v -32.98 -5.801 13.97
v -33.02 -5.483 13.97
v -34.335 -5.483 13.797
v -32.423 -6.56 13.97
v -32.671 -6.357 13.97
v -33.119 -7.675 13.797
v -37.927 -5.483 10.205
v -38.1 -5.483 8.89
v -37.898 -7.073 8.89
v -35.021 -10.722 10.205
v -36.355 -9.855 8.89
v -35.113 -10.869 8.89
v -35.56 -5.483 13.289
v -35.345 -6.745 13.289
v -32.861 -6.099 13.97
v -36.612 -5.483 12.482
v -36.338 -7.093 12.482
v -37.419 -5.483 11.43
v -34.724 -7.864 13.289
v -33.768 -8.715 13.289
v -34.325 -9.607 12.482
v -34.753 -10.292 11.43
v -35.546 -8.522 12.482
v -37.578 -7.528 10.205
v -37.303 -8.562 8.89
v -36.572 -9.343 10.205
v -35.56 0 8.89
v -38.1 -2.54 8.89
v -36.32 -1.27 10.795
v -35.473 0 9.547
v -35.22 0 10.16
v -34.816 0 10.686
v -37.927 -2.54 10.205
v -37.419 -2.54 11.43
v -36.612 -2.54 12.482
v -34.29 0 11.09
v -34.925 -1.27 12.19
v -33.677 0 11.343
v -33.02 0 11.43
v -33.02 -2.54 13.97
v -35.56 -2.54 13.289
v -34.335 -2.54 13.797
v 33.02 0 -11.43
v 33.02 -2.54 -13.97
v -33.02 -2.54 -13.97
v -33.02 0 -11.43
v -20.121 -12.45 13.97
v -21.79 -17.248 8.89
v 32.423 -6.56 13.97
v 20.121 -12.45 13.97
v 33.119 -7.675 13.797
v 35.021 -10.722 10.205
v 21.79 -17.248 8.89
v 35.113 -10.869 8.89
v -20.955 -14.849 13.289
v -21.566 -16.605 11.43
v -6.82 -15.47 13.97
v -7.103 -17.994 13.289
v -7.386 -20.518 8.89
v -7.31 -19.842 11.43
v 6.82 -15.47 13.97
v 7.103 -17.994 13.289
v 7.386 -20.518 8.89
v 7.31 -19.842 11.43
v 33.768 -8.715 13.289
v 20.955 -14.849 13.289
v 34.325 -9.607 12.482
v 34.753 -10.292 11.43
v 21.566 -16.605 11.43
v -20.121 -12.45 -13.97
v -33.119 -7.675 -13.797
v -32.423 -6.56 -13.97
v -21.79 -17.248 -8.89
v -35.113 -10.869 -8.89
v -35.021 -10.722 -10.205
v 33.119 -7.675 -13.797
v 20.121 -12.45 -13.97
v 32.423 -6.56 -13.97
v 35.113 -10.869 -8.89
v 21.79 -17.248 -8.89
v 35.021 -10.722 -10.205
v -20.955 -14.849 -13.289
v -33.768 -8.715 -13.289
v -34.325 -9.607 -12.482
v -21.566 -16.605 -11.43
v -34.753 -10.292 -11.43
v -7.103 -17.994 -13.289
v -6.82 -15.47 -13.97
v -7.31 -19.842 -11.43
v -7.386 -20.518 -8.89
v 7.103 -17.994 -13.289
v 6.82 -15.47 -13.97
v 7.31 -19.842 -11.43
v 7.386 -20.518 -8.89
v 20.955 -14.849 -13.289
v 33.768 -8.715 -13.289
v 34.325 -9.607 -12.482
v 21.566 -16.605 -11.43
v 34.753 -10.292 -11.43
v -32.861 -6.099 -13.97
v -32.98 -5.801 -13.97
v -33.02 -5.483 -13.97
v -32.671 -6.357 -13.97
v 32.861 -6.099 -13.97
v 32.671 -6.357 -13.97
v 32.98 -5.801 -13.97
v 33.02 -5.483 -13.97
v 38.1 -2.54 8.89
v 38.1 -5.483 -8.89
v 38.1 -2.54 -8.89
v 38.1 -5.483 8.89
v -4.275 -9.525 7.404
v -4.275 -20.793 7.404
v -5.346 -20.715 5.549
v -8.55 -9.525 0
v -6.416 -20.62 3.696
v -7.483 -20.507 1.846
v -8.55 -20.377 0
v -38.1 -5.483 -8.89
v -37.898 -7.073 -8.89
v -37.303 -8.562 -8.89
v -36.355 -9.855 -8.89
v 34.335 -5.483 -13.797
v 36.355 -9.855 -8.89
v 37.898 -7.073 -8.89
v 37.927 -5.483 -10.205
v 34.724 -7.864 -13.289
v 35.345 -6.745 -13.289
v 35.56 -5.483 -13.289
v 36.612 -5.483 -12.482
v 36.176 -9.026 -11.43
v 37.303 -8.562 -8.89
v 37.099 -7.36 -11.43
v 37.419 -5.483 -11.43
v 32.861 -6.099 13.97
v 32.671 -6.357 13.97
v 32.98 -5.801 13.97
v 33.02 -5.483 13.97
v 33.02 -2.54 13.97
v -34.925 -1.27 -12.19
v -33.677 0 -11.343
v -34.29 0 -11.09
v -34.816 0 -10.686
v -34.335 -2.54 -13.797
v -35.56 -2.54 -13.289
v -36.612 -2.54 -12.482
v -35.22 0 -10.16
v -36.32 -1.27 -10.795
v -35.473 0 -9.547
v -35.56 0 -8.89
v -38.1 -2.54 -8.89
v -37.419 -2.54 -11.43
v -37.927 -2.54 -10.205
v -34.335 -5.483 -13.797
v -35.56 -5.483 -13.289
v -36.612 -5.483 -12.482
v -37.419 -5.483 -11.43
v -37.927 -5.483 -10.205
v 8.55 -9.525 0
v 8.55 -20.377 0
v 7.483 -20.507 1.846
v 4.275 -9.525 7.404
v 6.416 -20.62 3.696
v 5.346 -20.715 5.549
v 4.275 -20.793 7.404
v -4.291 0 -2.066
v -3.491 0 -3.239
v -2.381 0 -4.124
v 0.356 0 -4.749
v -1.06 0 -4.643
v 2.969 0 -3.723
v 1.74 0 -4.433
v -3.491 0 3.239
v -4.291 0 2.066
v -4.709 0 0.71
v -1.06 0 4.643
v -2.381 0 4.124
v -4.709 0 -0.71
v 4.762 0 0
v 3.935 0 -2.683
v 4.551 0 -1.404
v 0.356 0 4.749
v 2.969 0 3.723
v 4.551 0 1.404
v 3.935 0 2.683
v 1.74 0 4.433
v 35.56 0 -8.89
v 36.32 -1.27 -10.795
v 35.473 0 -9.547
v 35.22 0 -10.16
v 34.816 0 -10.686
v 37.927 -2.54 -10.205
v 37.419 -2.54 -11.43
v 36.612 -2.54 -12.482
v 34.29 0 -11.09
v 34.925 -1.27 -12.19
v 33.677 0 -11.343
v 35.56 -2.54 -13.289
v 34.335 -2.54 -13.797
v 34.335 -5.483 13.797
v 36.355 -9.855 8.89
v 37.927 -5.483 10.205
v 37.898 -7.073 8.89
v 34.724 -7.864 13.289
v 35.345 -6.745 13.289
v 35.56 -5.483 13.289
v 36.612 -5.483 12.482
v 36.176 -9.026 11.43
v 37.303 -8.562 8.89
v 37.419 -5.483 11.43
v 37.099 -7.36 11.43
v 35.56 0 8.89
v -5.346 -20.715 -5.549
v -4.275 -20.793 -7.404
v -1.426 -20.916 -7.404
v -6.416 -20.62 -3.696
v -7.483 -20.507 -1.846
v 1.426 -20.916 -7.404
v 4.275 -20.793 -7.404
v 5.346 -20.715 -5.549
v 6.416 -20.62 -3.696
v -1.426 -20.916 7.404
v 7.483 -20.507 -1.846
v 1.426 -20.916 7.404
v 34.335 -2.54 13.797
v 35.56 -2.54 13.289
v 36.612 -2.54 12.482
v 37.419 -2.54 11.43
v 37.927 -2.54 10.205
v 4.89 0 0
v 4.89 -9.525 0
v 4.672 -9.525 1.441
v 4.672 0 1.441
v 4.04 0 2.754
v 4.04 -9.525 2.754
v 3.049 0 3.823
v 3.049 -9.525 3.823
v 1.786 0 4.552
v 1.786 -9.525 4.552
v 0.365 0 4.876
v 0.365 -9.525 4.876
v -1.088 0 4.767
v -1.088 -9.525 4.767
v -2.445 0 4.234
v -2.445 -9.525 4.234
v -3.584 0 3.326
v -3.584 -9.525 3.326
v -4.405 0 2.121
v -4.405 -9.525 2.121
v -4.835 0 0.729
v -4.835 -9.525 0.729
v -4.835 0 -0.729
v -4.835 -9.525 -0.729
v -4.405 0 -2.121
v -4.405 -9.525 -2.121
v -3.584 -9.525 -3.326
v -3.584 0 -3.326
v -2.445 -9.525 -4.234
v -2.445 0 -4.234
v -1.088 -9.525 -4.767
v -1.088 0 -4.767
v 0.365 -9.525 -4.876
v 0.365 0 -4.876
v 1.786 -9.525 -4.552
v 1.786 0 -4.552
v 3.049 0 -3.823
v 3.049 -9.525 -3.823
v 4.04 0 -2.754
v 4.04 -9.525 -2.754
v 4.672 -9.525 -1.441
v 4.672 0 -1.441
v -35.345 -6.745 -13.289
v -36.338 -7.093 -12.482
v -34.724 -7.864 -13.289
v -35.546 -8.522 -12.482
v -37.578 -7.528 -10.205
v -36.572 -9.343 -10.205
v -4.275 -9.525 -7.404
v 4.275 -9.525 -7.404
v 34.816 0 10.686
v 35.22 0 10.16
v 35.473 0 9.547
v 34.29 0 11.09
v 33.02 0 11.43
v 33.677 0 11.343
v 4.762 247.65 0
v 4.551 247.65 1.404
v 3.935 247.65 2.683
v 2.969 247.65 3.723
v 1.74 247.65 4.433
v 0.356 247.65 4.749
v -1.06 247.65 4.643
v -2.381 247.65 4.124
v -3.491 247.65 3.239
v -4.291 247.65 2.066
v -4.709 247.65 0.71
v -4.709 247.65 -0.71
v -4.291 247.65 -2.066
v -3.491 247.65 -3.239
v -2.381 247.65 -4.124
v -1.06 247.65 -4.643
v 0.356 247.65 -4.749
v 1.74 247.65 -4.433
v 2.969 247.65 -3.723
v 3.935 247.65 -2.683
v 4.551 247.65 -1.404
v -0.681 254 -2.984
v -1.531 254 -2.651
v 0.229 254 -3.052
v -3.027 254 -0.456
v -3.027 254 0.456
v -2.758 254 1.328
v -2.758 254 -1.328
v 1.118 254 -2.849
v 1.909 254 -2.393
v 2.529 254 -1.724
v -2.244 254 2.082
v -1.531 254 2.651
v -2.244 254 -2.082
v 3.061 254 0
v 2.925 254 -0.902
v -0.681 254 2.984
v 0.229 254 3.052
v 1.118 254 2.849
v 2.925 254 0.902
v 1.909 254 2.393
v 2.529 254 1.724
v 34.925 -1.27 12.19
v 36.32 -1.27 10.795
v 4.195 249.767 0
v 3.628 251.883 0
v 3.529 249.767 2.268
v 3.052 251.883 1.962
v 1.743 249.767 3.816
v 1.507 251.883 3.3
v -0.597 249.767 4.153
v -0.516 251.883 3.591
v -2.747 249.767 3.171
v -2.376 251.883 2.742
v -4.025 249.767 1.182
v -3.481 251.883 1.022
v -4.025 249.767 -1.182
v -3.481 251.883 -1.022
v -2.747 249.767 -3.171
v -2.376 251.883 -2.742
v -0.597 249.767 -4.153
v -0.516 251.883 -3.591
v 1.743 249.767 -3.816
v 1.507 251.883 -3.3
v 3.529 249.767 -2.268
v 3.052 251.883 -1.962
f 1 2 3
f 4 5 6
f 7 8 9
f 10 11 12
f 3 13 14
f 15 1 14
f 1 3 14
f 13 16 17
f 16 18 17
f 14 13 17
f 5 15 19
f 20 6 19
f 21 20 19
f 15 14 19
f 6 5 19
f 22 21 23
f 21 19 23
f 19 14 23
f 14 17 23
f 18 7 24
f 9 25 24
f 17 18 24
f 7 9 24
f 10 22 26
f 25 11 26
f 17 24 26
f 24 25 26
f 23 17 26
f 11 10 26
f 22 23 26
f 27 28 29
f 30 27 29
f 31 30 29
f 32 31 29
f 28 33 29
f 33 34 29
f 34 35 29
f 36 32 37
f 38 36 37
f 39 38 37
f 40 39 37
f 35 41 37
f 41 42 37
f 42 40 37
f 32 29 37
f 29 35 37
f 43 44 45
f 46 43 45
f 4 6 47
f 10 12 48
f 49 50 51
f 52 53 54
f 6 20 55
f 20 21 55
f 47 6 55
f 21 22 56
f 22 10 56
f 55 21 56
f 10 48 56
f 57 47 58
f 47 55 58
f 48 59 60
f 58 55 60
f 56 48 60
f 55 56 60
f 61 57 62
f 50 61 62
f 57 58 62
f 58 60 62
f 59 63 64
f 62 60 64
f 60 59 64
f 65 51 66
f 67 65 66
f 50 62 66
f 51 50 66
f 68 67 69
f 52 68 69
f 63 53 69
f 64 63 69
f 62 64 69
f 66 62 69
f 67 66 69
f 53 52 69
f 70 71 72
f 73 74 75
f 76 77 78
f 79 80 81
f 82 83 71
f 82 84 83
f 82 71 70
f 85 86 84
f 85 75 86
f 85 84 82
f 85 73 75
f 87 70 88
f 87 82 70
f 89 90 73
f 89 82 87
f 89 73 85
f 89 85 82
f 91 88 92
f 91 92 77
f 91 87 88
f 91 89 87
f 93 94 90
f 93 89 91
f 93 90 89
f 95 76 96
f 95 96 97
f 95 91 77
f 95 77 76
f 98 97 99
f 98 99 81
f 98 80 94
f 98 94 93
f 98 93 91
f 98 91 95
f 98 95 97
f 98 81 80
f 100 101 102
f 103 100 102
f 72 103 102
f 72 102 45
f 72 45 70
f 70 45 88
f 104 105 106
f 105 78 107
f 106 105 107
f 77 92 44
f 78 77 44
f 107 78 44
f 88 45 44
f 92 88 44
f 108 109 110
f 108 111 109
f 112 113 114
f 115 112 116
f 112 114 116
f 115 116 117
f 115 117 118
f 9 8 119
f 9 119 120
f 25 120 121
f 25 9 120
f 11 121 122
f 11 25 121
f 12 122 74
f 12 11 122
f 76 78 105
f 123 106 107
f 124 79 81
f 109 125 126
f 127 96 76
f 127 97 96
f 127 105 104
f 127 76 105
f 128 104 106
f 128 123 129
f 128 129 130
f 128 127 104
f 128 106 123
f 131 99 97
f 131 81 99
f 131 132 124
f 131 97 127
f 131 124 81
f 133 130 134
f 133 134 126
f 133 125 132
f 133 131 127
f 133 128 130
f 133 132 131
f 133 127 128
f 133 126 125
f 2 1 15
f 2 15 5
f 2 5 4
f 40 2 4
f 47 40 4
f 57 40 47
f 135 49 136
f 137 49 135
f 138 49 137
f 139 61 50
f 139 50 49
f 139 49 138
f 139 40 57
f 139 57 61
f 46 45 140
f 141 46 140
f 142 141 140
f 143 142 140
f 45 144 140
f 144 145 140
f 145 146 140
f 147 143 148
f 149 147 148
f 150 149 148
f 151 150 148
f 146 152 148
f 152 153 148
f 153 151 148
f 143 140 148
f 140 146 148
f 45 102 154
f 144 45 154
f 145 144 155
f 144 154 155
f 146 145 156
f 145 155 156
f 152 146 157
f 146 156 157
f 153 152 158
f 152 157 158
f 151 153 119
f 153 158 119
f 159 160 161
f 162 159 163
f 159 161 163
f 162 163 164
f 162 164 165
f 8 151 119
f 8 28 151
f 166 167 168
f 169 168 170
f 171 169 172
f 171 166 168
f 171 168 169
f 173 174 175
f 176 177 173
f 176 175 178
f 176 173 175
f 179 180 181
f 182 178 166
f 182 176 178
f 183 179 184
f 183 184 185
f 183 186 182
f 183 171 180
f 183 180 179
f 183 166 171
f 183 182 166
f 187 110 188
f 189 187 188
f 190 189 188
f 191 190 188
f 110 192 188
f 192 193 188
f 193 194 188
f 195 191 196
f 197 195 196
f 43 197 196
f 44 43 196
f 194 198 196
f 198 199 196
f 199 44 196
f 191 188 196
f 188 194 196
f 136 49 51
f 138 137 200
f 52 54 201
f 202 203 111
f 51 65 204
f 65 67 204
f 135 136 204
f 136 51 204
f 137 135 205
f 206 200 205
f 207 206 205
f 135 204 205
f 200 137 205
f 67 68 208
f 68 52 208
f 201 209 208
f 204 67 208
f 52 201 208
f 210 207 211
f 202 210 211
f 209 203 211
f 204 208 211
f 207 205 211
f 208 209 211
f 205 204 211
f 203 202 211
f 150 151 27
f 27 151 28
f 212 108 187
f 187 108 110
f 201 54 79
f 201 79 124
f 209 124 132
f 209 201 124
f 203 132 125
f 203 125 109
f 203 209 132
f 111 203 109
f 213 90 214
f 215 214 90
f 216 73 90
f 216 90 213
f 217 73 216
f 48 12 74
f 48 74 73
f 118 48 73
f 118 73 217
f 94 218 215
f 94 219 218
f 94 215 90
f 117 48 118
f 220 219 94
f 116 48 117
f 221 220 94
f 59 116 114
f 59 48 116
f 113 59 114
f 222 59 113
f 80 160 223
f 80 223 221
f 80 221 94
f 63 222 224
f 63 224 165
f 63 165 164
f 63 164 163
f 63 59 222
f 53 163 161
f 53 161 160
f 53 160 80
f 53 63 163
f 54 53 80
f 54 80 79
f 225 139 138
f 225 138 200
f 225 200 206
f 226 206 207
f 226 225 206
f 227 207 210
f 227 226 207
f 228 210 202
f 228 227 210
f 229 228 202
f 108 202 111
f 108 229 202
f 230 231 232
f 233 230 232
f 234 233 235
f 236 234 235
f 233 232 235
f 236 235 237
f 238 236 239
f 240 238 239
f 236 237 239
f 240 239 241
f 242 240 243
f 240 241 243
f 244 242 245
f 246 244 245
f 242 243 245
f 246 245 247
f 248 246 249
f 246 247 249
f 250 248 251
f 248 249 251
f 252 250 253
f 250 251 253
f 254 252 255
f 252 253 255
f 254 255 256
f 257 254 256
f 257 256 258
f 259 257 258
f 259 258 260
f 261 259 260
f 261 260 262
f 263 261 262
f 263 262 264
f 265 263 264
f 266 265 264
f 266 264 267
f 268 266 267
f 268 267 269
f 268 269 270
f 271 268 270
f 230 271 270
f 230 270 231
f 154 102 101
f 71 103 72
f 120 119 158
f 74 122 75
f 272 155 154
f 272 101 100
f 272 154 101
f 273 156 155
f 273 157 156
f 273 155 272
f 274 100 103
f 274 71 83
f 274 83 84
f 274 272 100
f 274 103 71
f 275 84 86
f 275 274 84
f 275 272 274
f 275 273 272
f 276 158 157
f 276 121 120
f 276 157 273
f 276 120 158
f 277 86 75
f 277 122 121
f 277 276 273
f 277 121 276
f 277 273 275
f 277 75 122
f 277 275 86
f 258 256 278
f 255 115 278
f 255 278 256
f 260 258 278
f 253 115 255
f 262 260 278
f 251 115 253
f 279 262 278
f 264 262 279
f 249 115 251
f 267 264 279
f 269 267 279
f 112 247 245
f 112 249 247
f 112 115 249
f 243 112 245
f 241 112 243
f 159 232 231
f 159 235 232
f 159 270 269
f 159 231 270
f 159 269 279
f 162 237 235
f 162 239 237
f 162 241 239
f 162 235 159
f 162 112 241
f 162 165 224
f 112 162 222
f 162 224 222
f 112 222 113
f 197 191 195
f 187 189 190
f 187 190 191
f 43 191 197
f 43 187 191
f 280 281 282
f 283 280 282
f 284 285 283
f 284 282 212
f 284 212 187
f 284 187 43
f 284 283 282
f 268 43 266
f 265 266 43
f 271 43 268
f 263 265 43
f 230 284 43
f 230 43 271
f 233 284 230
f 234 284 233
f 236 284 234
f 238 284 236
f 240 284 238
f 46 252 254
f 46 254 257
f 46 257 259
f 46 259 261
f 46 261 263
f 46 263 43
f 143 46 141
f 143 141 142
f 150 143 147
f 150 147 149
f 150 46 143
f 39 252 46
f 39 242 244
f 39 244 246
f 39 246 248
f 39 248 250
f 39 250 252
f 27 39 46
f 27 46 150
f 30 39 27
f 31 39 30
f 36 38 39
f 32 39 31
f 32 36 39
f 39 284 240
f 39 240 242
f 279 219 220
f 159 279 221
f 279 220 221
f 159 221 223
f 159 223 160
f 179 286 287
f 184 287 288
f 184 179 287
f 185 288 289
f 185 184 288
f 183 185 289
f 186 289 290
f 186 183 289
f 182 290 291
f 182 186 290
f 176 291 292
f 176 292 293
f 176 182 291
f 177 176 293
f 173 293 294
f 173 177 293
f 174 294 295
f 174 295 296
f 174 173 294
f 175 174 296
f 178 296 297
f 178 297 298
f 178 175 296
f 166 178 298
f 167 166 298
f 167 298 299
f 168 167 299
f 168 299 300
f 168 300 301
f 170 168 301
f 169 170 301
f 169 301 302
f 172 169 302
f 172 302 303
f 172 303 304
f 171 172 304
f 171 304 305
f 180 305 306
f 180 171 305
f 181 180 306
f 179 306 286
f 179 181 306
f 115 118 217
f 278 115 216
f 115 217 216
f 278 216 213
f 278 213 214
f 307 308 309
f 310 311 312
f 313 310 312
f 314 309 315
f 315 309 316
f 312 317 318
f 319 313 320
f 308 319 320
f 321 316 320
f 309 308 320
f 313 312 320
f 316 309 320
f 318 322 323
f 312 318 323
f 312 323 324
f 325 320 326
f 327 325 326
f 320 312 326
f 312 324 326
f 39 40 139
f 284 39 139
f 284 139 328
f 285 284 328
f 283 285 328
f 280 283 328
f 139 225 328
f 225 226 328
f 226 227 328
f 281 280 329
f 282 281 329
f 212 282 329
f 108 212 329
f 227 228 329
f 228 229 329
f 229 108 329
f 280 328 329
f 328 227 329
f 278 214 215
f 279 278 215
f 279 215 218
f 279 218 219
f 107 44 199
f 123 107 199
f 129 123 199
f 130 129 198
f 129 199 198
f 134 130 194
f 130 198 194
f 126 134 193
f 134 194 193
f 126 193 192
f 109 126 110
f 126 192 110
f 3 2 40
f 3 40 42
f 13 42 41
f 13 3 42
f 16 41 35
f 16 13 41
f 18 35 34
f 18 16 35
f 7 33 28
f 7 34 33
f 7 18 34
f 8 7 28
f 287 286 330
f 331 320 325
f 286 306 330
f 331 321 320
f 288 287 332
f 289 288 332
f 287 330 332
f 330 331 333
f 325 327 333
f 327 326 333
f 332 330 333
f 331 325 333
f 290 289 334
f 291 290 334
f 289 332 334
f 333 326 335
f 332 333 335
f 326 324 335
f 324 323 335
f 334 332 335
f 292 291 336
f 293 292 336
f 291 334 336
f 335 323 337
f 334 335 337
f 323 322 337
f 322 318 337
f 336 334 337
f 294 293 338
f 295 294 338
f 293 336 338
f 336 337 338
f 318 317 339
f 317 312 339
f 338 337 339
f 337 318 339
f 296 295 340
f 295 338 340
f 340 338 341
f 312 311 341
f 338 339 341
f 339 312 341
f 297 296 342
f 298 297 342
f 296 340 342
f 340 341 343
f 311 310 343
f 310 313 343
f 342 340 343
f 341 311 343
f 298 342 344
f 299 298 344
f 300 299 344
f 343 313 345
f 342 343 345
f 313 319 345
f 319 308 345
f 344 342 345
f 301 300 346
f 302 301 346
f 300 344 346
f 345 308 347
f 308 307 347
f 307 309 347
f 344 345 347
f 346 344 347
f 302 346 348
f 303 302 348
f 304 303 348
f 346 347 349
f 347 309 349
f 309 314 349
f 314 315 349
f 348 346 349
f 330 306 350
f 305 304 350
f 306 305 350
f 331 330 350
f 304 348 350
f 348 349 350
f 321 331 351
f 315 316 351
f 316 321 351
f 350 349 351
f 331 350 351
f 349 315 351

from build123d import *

# Parameters (mm, degrees)
F0_R      = 4.7625
F1_DEPTH  = 254
F2_SIZE2  = 1.7014773719
F2_SIZE   = 6.35
F4_DEPTH  = 13.97
F7_DEPTH  = 15.875
F8_R      = 6.35
F9_R      = 4.8895
F10_DEPTH = 263.526
F11_R     = 5.08
F12_SIZE  = 2.54


# Not quite as in the source:
# - a feature names something its author has since deleted; it is built from what else it names


with BuildPart() as f1:
    # F0 (on Front) → F1 (new body)
    with BuildSketch(Plane.XZ):
        Circle(F0_R)
    extrude(amount=-F1_DEPTH)

    # F2
    f2_edges = [f1.edges().sort_by_distance(p)[0] for p in [
        (-4.7625, 254, 0),
    ]]
    f2_side = f1.faces().sort_by_distance((-4.7625, 127, 0))[0]
    chamfer(f2_edges, length=F2_SIZE, length2=F2_SIZE2, reference=f2_side)


with BuildPart() as f4:
    # F3 (on Top) → F4 (new body, symmetric)
    with BuildSketch(Plane.XY):
        with BuildLine():
            Line((-38.1, 0), (-38.1, -8.89))
            ThreePointArc((-38.1, -8.89), (0, -20.9310323016), (38.1, -8.89))
            Line((38.1, -8.89), (38.1, 0))
            Line((38.1, 0), (-38.1, 0))
        make_face()
    extrude(amount=F4_DEPTH, both=True)

    # F6 (on offset) → F7 (cut)
    with BuildSketch(Plane.XZ.offset(25.4)):
        Polygon((8.5495182562, 0), (4.2747591281, 7.4041), (-4.2747591281, 7.4041), (-8.5495182562, 0), (-4.2747591281, -7.4041), (4.2747591281, -7.4041), align=None)
    extrude(amount=-F7_DEPTH, mode=Mode.SUBTRACT)

    # F8
    f8_edges = [f4.edges().sort_by_distance(p)[0] for p in [
        (38.1, -8.89, 0),
        (-38.1, -8.89, 0),
    ]]
    fillet(f8_edges, radius=F8_R)

    # F9 (on face) → F10 (cut, through all)
    with BuildSketch(Plane.XZ.offset(9.525)):
        Circle(F9_R)
    extrude(amount=-F10_DEPTH, mode=Mode.SUBTRACT)

    # F11
    f11_edges = [f4.edges().sort_by_distance(p)[0] for p in [
        (0, -20.931032, -13.97),
        (0, -20.931032, 13.97),
        (-37.3033, -8.562348, -13.97),
        (37.3033, -8.562348, -13.97),
        (-37.3033, -8.562348, 13.97),
        (37.3033, -8.562348, 13.97),
    ]]
    fillet(f11_edges, radius=F11_R)

    # F12
    f12_edges = [f4.edges().sort_by_distance(p)[0] for p in [
        (0, 0, -13.97),
        (-38.1, 0, 0),
        (0, 0, 13.97),
        (38.1, 0, 0),
        (-36.612102, 0, 12.482102),
        (-36.612102, 0, -12.482102),
        (36.612102, 0, -12.482102),
        (36.612102, 0, 12.482102),
    ]]
    chamfer(f12_edges, length=F12_SIZE)


solid = Compound([f1.part, f4.part])
